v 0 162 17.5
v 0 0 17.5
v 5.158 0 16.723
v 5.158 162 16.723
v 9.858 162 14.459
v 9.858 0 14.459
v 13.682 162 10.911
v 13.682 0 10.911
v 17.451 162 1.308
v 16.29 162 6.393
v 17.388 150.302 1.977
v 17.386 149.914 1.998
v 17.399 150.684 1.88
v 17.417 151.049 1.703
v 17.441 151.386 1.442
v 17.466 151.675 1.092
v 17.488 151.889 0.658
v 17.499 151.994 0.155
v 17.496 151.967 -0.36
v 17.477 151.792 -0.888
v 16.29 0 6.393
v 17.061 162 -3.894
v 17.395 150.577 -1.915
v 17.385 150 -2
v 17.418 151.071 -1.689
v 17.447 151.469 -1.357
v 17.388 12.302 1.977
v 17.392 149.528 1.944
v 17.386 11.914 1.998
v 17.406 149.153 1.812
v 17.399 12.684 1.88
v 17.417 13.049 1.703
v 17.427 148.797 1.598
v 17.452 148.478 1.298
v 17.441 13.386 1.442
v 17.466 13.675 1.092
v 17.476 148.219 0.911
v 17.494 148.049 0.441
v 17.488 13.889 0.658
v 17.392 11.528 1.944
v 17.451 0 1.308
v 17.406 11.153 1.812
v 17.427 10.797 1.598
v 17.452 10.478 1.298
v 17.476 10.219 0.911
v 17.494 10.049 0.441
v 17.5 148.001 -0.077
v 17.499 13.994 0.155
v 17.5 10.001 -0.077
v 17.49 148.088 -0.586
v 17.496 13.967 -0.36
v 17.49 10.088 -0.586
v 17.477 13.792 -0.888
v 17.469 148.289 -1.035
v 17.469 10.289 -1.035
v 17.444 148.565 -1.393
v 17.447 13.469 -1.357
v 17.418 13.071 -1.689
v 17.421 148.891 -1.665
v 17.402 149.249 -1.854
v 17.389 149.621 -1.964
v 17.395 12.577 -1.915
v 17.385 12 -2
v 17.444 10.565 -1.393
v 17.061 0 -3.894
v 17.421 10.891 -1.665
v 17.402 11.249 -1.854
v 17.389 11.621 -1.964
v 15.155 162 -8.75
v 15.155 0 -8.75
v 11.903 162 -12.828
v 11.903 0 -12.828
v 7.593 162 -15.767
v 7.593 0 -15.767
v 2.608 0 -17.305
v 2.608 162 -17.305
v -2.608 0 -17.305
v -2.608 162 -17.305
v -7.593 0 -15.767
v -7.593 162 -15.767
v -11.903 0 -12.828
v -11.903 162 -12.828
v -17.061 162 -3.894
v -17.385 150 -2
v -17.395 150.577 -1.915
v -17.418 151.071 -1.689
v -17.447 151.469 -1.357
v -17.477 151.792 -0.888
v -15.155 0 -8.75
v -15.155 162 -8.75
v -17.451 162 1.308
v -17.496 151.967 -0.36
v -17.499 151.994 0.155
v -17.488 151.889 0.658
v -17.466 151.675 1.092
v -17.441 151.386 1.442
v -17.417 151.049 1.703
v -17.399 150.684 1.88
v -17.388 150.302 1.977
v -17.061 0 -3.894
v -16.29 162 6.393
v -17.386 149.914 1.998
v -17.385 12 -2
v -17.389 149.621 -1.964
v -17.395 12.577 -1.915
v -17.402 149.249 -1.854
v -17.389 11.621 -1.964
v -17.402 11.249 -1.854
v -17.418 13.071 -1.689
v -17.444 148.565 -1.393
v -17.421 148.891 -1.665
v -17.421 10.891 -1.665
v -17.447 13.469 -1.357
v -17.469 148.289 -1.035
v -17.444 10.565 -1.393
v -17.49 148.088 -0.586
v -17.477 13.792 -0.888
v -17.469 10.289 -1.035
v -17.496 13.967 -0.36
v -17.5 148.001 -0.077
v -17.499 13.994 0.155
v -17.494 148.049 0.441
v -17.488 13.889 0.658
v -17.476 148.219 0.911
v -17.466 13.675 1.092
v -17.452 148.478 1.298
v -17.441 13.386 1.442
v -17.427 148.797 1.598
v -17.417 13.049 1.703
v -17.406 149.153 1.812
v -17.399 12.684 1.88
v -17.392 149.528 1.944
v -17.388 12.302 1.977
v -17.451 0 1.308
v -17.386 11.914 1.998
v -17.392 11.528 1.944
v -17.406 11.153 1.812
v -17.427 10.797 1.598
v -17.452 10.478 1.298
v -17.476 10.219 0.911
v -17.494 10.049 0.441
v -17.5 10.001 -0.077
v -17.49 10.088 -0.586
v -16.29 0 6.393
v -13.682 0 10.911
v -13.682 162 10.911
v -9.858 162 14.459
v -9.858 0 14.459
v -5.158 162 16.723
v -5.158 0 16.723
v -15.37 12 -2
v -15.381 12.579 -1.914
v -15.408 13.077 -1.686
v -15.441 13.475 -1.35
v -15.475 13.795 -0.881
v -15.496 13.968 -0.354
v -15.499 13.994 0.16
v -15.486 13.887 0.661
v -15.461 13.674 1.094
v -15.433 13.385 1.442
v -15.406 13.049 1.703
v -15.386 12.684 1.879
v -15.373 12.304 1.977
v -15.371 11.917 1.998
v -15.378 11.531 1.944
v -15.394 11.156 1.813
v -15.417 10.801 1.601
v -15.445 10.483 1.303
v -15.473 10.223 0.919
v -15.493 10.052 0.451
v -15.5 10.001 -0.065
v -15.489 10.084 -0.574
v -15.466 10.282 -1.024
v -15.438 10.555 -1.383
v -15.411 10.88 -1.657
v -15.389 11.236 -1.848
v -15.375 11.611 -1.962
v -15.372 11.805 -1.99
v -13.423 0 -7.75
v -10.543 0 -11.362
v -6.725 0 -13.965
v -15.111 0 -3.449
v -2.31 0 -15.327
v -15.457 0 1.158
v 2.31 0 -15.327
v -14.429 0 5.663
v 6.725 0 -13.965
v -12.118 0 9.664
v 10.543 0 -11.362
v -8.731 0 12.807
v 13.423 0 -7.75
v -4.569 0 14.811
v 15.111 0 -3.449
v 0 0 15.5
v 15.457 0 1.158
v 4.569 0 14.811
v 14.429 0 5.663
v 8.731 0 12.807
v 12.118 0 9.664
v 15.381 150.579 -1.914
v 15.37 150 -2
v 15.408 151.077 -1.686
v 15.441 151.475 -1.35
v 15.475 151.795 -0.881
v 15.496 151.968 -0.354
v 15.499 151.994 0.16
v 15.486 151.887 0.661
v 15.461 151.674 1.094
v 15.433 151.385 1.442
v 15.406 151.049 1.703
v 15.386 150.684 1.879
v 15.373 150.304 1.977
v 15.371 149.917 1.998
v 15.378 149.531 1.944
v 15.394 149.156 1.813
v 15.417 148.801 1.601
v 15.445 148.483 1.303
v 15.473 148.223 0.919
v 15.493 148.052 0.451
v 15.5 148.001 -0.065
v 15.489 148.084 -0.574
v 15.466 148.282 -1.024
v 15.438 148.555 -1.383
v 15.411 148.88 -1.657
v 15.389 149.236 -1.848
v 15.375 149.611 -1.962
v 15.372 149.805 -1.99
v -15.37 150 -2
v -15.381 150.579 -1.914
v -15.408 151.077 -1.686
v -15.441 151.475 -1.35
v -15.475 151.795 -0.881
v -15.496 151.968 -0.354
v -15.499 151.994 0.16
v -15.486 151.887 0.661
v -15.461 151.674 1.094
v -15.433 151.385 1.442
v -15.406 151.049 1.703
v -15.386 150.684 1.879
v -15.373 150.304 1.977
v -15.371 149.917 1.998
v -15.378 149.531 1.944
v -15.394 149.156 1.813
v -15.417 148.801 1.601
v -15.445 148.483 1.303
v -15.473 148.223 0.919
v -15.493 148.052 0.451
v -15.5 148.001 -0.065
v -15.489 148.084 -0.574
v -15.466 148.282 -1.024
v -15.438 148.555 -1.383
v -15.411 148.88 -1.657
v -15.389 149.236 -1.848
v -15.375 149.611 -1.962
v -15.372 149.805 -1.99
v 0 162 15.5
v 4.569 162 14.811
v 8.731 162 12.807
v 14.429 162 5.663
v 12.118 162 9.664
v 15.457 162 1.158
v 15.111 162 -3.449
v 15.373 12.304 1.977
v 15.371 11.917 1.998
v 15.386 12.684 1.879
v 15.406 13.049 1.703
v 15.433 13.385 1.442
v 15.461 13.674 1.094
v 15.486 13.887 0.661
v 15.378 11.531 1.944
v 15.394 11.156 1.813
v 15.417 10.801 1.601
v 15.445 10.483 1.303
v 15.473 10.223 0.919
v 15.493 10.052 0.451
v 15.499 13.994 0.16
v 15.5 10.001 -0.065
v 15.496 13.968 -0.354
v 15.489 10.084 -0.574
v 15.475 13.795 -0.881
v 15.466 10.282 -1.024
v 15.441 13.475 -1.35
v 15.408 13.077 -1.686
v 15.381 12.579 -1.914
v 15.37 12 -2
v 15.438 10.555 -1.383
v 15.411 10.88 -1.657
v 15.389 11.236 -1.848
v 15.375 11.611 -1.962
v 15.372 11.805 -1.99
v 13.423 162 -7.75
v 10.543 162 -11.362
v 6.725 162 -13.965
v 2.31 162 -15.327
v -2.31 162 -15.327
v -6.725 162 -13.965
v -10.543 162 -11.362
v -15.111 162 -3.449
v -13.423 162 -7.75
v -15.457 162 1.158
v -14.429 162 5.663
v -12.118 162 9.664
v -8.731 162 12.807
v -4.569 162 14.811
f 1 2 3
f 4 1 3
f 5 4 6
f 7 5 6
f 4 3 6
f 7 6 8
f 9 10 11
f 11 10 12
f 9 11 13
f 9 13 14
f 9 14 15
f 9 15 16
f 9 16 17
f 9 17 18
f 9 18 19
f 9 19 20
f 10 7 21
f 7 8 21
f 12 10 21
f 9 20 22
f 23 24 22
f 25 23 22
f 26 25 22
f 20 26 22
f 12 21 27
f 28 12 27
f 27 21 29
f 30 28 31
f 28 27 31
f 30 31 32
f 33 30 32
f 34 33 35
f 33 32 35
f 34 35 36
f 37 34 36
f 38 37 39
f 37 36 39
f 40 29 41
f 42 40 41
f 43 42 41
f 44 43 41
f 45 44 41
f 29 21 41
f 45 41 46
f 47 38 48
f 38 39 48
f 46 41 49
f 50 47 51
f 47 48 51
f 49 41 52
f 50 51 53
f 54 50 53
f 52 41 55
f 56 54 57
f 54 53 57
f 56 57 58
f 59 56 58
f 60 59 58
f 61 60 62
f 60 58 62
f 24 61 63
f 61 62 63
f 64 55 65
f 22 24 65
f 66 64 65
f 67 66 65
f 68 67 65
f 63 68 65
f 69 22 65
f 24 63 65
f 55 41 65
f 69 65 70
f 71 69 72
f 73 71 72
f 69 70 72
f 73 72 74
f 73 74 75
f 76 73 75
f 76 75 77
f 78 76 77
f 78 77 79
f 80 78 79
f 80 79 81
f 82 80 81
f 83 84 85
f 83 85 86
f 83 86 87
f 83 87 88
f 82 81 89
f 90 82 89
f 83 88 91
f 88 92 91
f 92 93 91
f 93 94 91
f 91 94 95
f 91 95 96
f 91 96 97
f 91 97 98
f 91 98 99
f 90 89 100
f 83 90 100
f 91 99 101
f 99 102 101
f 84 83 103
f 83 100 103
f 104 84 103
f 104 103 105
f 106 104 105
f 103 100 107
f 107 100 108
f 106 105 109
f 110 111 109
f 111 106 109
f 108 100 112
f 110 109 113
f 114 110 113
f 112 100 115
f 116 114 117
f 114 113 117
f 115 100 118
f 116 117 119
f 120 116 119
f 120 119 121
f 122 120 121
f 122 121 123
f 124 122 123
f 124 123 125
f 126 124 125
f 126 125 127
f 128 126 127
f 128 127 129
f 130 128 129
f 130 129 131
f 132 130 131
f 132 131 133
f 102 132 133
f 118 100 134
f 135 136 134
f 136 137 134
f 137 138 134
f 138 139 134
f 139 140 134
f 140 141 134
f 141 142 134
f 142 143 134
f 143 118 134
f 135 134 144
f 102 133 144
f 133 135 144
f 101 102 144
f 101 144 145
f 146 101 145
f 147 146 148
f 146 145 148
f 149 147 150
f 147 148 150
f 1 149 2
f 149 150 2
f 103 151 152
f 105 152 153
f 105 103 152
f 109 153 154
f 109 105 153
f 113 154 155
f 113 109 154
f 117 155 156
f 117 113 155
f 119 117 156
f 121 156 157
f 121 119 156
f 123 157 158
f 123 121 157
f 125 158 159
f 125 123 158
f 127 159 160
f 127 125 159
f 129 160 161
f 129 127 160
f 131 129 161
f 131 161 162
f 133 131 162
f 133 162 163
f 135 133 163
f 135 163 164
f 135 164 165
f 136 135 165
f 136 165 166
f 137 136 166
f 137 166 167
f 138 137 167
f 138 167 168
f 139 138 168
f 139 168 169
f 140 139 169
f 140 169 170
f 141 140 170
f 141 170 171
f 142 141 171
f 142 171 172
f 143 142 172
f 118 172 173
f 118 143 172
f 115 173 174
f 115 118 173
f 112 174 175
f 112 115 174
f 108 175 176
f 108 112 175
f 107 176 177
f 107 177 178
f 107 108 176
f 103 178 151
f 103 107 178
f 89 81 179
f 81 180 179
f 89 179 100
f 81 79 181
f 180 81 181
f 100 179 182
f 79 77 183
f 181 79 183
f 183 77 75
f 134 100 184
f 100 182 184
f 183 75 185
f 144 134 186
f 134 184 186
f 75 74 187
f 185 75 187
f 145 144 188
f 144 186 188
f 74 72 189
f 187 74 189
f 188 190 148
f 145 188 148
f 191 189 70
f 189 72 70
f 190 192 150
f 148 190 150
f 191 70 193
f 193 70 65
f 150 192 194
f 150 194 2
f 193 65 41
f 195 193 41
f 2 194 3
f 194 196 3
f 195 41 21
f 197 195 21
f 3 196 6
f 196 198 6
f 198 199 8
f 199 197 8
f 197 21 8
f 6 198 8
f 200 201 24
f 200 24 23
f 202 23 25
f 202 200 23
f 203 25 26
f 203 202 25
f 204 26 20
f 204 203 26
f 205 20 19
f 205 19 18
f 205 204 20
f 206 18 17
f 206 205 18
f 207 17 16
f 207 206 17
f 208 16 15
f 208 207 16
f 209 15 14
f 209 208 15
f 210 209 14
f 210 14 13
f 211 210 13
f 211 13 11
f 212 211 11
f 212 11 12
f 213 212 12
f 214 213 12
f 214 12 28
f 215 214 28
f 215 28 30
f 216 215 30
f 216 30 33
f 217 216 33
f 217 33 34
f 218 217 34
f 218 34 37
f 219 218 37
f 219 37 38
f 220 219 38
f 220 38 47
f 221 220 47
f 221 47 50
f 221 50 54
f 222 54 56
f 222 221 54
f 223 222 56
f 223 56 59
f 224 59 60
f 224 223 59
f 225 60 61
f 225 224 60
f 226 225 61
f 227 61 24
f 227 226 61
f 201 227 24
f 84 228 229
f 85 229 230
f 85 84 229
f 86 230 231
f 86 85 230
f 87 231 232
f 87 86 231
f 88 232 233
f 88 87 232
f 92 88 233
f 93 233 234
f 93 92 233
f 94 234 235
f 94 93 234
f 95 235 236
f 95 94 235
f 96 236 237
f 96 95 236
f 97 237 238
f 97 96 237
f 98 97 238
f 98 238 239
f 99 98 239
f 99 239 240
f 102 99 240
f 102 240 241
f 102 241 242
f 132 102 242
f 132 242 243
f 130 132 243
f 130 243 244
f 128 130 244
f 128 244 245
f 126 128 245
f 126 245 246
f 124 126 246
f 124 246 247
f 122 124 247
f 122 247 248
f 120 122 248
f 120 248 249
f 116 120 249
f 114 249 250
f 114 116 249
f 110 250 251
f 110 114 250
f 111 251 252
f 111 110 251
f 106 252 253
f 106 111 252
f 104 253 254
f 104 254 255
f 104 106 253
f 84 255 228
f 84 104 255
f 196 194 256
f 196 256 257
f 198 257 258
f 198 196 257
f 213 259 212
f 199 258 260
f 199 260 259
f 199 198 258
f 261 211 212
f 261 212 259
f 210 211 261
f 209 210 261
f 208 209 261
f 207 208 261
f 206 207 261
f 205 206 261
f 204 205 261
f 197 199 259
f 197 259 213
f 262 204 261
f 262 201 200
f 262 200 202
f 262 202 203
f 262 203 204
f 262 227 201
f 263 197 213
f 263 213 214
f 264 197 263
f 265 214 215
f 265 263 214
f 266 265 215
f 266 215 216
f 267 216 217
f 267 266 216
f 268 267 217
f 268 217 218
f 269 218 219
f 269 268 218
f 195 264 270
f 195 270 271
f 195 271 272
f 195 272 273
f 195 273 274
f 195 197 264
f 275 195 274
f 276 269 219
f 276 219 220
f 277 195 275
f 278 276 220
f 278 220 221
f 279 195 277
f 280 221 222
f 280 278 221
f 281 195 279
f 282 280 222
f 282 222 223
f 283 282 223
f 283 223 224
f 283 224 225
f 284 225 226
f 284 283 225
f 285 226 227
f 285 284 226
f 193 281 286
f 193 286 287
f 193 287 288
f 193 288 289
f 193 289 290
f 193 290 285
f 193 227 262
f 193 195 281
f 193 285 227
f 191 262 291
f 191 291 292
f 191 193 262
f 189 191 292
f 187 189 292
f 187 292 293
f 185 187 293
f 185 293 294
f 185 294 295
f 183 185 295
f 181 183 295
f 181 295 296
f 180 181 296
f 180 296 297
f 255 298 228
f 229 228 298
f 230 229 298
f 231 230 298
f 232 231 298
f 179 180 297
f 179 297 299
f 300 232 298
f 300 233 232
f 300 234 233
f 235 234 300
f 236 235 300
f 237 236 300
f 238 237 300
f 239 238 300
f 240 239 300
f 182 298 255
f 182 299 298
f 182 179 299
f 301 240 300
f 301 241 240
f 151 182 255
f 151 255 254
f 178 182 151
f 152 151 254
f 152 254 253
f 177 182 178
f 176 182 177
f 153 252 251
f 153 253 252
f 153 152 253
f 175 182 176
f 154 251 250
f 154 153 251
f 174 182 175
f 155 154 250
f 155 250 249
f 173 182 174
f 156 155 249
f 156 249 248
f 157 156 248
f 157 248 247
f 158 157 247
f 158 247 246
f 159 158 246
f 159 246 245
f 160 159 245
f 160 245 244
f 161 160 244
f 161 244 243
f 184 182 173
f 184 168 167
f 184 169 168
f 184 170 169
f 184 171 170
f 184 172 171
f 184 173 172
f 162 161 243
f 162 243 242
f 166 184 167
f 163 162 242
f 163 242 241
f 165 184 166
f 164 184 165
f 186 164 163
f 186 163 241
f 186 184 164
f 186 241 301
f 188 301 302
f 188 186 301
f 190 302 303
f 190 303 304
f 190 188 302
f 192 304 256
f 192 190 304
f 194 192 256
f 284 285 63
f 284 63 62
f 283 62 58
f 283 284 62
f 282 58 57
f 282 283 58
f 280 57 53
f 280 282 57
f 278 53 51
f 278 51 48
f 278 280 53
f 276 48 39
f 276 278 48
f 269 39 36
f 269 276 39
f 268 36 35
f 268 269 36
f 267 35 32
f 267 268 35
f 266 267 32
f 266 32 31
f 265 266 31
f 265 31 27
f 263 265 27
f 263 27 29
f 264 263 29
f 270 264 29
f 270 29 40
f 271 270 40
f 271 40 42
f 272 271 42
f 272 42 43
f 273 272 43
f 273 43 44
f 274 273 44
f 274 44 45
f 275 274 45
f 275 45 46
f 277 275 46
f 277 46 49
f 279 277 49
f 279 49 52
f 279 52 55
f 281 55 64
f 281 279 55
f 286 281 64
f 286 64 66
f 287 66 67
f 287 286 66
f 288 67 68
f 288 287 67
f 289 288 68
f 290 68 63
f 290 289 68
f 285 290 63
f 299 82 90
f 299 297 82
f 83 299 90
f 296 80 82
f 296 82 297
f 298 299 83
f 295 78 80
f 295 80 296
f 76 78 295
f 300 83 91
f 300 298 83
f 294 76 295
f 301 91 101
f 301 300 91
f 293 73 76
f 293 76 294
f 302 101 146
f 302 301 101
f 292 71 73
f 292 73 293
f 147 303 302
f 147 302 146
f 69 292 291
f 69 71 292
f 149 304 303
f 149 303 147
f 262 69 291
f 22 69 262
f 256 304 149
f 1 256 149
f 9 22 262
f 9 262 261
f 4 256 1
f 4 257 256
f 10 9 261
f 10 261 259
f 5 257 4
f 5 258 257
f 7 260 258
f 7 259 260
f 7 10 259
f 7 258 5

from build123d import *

# Parameters (mm, degrees)
ESQUISSE1_R                  = 17.5
ESQUISSE1_R_2                = 15.5
BOSS_EXTRU_1_DEPTH           = 162
ENL_V_MAT_EXTRU_1_DEPTH      = 164.879528923
ENL_V_MAT_EXTRU_1_DEPTH_BACK = 164.879528923
ESQUISSE2_R                  = 2


with BuildPart() as part:
    # Esquisse1 → Boss.-Extru.1 (new body)
    with BuildSketch(Plane(origin=(0, 0, 0), x_dir=(1, 0, 0), z_dir=(0, 1, 0))):
        with Locations(Location((0, 0, 0), (0, 0, 270))):
            Circle(ESQUISSE1_R)
        with Locations(Location((0, 0, 0), (0, 0, 270))):
            Circle(ESQUISSE1_R_2, mode=Mode.SUBTRACT)
    extrude(amount=BOSS_EXTRU_1_DEPTH)

    # Esquisse2 → Enlèv. mat.-Extru.1 (cut, two sides: drawn at the far end of the back side and taken through both)
    with BuildSketch(Plane(origin=(0, 0, 0), x_dir=(0, 0, -1), z_dir=(1, 0, 0)).offset(-ENL_V_MAT_EXTRU_1_DEPTH_BACK)):
        with Locations((0, 150)):
            Circle(ESQUISSE2_R)
        with Locations((0, 12)):
            Circle(ESQUISSE2_R)
    extrude(amount=ENL_V_MAT_EXTRU_1_DEPTH + ENL_V_MAT_EXTRU_1_DEPTH_BACK, mode=Mode.SUBTRACT)


solid = part.part
